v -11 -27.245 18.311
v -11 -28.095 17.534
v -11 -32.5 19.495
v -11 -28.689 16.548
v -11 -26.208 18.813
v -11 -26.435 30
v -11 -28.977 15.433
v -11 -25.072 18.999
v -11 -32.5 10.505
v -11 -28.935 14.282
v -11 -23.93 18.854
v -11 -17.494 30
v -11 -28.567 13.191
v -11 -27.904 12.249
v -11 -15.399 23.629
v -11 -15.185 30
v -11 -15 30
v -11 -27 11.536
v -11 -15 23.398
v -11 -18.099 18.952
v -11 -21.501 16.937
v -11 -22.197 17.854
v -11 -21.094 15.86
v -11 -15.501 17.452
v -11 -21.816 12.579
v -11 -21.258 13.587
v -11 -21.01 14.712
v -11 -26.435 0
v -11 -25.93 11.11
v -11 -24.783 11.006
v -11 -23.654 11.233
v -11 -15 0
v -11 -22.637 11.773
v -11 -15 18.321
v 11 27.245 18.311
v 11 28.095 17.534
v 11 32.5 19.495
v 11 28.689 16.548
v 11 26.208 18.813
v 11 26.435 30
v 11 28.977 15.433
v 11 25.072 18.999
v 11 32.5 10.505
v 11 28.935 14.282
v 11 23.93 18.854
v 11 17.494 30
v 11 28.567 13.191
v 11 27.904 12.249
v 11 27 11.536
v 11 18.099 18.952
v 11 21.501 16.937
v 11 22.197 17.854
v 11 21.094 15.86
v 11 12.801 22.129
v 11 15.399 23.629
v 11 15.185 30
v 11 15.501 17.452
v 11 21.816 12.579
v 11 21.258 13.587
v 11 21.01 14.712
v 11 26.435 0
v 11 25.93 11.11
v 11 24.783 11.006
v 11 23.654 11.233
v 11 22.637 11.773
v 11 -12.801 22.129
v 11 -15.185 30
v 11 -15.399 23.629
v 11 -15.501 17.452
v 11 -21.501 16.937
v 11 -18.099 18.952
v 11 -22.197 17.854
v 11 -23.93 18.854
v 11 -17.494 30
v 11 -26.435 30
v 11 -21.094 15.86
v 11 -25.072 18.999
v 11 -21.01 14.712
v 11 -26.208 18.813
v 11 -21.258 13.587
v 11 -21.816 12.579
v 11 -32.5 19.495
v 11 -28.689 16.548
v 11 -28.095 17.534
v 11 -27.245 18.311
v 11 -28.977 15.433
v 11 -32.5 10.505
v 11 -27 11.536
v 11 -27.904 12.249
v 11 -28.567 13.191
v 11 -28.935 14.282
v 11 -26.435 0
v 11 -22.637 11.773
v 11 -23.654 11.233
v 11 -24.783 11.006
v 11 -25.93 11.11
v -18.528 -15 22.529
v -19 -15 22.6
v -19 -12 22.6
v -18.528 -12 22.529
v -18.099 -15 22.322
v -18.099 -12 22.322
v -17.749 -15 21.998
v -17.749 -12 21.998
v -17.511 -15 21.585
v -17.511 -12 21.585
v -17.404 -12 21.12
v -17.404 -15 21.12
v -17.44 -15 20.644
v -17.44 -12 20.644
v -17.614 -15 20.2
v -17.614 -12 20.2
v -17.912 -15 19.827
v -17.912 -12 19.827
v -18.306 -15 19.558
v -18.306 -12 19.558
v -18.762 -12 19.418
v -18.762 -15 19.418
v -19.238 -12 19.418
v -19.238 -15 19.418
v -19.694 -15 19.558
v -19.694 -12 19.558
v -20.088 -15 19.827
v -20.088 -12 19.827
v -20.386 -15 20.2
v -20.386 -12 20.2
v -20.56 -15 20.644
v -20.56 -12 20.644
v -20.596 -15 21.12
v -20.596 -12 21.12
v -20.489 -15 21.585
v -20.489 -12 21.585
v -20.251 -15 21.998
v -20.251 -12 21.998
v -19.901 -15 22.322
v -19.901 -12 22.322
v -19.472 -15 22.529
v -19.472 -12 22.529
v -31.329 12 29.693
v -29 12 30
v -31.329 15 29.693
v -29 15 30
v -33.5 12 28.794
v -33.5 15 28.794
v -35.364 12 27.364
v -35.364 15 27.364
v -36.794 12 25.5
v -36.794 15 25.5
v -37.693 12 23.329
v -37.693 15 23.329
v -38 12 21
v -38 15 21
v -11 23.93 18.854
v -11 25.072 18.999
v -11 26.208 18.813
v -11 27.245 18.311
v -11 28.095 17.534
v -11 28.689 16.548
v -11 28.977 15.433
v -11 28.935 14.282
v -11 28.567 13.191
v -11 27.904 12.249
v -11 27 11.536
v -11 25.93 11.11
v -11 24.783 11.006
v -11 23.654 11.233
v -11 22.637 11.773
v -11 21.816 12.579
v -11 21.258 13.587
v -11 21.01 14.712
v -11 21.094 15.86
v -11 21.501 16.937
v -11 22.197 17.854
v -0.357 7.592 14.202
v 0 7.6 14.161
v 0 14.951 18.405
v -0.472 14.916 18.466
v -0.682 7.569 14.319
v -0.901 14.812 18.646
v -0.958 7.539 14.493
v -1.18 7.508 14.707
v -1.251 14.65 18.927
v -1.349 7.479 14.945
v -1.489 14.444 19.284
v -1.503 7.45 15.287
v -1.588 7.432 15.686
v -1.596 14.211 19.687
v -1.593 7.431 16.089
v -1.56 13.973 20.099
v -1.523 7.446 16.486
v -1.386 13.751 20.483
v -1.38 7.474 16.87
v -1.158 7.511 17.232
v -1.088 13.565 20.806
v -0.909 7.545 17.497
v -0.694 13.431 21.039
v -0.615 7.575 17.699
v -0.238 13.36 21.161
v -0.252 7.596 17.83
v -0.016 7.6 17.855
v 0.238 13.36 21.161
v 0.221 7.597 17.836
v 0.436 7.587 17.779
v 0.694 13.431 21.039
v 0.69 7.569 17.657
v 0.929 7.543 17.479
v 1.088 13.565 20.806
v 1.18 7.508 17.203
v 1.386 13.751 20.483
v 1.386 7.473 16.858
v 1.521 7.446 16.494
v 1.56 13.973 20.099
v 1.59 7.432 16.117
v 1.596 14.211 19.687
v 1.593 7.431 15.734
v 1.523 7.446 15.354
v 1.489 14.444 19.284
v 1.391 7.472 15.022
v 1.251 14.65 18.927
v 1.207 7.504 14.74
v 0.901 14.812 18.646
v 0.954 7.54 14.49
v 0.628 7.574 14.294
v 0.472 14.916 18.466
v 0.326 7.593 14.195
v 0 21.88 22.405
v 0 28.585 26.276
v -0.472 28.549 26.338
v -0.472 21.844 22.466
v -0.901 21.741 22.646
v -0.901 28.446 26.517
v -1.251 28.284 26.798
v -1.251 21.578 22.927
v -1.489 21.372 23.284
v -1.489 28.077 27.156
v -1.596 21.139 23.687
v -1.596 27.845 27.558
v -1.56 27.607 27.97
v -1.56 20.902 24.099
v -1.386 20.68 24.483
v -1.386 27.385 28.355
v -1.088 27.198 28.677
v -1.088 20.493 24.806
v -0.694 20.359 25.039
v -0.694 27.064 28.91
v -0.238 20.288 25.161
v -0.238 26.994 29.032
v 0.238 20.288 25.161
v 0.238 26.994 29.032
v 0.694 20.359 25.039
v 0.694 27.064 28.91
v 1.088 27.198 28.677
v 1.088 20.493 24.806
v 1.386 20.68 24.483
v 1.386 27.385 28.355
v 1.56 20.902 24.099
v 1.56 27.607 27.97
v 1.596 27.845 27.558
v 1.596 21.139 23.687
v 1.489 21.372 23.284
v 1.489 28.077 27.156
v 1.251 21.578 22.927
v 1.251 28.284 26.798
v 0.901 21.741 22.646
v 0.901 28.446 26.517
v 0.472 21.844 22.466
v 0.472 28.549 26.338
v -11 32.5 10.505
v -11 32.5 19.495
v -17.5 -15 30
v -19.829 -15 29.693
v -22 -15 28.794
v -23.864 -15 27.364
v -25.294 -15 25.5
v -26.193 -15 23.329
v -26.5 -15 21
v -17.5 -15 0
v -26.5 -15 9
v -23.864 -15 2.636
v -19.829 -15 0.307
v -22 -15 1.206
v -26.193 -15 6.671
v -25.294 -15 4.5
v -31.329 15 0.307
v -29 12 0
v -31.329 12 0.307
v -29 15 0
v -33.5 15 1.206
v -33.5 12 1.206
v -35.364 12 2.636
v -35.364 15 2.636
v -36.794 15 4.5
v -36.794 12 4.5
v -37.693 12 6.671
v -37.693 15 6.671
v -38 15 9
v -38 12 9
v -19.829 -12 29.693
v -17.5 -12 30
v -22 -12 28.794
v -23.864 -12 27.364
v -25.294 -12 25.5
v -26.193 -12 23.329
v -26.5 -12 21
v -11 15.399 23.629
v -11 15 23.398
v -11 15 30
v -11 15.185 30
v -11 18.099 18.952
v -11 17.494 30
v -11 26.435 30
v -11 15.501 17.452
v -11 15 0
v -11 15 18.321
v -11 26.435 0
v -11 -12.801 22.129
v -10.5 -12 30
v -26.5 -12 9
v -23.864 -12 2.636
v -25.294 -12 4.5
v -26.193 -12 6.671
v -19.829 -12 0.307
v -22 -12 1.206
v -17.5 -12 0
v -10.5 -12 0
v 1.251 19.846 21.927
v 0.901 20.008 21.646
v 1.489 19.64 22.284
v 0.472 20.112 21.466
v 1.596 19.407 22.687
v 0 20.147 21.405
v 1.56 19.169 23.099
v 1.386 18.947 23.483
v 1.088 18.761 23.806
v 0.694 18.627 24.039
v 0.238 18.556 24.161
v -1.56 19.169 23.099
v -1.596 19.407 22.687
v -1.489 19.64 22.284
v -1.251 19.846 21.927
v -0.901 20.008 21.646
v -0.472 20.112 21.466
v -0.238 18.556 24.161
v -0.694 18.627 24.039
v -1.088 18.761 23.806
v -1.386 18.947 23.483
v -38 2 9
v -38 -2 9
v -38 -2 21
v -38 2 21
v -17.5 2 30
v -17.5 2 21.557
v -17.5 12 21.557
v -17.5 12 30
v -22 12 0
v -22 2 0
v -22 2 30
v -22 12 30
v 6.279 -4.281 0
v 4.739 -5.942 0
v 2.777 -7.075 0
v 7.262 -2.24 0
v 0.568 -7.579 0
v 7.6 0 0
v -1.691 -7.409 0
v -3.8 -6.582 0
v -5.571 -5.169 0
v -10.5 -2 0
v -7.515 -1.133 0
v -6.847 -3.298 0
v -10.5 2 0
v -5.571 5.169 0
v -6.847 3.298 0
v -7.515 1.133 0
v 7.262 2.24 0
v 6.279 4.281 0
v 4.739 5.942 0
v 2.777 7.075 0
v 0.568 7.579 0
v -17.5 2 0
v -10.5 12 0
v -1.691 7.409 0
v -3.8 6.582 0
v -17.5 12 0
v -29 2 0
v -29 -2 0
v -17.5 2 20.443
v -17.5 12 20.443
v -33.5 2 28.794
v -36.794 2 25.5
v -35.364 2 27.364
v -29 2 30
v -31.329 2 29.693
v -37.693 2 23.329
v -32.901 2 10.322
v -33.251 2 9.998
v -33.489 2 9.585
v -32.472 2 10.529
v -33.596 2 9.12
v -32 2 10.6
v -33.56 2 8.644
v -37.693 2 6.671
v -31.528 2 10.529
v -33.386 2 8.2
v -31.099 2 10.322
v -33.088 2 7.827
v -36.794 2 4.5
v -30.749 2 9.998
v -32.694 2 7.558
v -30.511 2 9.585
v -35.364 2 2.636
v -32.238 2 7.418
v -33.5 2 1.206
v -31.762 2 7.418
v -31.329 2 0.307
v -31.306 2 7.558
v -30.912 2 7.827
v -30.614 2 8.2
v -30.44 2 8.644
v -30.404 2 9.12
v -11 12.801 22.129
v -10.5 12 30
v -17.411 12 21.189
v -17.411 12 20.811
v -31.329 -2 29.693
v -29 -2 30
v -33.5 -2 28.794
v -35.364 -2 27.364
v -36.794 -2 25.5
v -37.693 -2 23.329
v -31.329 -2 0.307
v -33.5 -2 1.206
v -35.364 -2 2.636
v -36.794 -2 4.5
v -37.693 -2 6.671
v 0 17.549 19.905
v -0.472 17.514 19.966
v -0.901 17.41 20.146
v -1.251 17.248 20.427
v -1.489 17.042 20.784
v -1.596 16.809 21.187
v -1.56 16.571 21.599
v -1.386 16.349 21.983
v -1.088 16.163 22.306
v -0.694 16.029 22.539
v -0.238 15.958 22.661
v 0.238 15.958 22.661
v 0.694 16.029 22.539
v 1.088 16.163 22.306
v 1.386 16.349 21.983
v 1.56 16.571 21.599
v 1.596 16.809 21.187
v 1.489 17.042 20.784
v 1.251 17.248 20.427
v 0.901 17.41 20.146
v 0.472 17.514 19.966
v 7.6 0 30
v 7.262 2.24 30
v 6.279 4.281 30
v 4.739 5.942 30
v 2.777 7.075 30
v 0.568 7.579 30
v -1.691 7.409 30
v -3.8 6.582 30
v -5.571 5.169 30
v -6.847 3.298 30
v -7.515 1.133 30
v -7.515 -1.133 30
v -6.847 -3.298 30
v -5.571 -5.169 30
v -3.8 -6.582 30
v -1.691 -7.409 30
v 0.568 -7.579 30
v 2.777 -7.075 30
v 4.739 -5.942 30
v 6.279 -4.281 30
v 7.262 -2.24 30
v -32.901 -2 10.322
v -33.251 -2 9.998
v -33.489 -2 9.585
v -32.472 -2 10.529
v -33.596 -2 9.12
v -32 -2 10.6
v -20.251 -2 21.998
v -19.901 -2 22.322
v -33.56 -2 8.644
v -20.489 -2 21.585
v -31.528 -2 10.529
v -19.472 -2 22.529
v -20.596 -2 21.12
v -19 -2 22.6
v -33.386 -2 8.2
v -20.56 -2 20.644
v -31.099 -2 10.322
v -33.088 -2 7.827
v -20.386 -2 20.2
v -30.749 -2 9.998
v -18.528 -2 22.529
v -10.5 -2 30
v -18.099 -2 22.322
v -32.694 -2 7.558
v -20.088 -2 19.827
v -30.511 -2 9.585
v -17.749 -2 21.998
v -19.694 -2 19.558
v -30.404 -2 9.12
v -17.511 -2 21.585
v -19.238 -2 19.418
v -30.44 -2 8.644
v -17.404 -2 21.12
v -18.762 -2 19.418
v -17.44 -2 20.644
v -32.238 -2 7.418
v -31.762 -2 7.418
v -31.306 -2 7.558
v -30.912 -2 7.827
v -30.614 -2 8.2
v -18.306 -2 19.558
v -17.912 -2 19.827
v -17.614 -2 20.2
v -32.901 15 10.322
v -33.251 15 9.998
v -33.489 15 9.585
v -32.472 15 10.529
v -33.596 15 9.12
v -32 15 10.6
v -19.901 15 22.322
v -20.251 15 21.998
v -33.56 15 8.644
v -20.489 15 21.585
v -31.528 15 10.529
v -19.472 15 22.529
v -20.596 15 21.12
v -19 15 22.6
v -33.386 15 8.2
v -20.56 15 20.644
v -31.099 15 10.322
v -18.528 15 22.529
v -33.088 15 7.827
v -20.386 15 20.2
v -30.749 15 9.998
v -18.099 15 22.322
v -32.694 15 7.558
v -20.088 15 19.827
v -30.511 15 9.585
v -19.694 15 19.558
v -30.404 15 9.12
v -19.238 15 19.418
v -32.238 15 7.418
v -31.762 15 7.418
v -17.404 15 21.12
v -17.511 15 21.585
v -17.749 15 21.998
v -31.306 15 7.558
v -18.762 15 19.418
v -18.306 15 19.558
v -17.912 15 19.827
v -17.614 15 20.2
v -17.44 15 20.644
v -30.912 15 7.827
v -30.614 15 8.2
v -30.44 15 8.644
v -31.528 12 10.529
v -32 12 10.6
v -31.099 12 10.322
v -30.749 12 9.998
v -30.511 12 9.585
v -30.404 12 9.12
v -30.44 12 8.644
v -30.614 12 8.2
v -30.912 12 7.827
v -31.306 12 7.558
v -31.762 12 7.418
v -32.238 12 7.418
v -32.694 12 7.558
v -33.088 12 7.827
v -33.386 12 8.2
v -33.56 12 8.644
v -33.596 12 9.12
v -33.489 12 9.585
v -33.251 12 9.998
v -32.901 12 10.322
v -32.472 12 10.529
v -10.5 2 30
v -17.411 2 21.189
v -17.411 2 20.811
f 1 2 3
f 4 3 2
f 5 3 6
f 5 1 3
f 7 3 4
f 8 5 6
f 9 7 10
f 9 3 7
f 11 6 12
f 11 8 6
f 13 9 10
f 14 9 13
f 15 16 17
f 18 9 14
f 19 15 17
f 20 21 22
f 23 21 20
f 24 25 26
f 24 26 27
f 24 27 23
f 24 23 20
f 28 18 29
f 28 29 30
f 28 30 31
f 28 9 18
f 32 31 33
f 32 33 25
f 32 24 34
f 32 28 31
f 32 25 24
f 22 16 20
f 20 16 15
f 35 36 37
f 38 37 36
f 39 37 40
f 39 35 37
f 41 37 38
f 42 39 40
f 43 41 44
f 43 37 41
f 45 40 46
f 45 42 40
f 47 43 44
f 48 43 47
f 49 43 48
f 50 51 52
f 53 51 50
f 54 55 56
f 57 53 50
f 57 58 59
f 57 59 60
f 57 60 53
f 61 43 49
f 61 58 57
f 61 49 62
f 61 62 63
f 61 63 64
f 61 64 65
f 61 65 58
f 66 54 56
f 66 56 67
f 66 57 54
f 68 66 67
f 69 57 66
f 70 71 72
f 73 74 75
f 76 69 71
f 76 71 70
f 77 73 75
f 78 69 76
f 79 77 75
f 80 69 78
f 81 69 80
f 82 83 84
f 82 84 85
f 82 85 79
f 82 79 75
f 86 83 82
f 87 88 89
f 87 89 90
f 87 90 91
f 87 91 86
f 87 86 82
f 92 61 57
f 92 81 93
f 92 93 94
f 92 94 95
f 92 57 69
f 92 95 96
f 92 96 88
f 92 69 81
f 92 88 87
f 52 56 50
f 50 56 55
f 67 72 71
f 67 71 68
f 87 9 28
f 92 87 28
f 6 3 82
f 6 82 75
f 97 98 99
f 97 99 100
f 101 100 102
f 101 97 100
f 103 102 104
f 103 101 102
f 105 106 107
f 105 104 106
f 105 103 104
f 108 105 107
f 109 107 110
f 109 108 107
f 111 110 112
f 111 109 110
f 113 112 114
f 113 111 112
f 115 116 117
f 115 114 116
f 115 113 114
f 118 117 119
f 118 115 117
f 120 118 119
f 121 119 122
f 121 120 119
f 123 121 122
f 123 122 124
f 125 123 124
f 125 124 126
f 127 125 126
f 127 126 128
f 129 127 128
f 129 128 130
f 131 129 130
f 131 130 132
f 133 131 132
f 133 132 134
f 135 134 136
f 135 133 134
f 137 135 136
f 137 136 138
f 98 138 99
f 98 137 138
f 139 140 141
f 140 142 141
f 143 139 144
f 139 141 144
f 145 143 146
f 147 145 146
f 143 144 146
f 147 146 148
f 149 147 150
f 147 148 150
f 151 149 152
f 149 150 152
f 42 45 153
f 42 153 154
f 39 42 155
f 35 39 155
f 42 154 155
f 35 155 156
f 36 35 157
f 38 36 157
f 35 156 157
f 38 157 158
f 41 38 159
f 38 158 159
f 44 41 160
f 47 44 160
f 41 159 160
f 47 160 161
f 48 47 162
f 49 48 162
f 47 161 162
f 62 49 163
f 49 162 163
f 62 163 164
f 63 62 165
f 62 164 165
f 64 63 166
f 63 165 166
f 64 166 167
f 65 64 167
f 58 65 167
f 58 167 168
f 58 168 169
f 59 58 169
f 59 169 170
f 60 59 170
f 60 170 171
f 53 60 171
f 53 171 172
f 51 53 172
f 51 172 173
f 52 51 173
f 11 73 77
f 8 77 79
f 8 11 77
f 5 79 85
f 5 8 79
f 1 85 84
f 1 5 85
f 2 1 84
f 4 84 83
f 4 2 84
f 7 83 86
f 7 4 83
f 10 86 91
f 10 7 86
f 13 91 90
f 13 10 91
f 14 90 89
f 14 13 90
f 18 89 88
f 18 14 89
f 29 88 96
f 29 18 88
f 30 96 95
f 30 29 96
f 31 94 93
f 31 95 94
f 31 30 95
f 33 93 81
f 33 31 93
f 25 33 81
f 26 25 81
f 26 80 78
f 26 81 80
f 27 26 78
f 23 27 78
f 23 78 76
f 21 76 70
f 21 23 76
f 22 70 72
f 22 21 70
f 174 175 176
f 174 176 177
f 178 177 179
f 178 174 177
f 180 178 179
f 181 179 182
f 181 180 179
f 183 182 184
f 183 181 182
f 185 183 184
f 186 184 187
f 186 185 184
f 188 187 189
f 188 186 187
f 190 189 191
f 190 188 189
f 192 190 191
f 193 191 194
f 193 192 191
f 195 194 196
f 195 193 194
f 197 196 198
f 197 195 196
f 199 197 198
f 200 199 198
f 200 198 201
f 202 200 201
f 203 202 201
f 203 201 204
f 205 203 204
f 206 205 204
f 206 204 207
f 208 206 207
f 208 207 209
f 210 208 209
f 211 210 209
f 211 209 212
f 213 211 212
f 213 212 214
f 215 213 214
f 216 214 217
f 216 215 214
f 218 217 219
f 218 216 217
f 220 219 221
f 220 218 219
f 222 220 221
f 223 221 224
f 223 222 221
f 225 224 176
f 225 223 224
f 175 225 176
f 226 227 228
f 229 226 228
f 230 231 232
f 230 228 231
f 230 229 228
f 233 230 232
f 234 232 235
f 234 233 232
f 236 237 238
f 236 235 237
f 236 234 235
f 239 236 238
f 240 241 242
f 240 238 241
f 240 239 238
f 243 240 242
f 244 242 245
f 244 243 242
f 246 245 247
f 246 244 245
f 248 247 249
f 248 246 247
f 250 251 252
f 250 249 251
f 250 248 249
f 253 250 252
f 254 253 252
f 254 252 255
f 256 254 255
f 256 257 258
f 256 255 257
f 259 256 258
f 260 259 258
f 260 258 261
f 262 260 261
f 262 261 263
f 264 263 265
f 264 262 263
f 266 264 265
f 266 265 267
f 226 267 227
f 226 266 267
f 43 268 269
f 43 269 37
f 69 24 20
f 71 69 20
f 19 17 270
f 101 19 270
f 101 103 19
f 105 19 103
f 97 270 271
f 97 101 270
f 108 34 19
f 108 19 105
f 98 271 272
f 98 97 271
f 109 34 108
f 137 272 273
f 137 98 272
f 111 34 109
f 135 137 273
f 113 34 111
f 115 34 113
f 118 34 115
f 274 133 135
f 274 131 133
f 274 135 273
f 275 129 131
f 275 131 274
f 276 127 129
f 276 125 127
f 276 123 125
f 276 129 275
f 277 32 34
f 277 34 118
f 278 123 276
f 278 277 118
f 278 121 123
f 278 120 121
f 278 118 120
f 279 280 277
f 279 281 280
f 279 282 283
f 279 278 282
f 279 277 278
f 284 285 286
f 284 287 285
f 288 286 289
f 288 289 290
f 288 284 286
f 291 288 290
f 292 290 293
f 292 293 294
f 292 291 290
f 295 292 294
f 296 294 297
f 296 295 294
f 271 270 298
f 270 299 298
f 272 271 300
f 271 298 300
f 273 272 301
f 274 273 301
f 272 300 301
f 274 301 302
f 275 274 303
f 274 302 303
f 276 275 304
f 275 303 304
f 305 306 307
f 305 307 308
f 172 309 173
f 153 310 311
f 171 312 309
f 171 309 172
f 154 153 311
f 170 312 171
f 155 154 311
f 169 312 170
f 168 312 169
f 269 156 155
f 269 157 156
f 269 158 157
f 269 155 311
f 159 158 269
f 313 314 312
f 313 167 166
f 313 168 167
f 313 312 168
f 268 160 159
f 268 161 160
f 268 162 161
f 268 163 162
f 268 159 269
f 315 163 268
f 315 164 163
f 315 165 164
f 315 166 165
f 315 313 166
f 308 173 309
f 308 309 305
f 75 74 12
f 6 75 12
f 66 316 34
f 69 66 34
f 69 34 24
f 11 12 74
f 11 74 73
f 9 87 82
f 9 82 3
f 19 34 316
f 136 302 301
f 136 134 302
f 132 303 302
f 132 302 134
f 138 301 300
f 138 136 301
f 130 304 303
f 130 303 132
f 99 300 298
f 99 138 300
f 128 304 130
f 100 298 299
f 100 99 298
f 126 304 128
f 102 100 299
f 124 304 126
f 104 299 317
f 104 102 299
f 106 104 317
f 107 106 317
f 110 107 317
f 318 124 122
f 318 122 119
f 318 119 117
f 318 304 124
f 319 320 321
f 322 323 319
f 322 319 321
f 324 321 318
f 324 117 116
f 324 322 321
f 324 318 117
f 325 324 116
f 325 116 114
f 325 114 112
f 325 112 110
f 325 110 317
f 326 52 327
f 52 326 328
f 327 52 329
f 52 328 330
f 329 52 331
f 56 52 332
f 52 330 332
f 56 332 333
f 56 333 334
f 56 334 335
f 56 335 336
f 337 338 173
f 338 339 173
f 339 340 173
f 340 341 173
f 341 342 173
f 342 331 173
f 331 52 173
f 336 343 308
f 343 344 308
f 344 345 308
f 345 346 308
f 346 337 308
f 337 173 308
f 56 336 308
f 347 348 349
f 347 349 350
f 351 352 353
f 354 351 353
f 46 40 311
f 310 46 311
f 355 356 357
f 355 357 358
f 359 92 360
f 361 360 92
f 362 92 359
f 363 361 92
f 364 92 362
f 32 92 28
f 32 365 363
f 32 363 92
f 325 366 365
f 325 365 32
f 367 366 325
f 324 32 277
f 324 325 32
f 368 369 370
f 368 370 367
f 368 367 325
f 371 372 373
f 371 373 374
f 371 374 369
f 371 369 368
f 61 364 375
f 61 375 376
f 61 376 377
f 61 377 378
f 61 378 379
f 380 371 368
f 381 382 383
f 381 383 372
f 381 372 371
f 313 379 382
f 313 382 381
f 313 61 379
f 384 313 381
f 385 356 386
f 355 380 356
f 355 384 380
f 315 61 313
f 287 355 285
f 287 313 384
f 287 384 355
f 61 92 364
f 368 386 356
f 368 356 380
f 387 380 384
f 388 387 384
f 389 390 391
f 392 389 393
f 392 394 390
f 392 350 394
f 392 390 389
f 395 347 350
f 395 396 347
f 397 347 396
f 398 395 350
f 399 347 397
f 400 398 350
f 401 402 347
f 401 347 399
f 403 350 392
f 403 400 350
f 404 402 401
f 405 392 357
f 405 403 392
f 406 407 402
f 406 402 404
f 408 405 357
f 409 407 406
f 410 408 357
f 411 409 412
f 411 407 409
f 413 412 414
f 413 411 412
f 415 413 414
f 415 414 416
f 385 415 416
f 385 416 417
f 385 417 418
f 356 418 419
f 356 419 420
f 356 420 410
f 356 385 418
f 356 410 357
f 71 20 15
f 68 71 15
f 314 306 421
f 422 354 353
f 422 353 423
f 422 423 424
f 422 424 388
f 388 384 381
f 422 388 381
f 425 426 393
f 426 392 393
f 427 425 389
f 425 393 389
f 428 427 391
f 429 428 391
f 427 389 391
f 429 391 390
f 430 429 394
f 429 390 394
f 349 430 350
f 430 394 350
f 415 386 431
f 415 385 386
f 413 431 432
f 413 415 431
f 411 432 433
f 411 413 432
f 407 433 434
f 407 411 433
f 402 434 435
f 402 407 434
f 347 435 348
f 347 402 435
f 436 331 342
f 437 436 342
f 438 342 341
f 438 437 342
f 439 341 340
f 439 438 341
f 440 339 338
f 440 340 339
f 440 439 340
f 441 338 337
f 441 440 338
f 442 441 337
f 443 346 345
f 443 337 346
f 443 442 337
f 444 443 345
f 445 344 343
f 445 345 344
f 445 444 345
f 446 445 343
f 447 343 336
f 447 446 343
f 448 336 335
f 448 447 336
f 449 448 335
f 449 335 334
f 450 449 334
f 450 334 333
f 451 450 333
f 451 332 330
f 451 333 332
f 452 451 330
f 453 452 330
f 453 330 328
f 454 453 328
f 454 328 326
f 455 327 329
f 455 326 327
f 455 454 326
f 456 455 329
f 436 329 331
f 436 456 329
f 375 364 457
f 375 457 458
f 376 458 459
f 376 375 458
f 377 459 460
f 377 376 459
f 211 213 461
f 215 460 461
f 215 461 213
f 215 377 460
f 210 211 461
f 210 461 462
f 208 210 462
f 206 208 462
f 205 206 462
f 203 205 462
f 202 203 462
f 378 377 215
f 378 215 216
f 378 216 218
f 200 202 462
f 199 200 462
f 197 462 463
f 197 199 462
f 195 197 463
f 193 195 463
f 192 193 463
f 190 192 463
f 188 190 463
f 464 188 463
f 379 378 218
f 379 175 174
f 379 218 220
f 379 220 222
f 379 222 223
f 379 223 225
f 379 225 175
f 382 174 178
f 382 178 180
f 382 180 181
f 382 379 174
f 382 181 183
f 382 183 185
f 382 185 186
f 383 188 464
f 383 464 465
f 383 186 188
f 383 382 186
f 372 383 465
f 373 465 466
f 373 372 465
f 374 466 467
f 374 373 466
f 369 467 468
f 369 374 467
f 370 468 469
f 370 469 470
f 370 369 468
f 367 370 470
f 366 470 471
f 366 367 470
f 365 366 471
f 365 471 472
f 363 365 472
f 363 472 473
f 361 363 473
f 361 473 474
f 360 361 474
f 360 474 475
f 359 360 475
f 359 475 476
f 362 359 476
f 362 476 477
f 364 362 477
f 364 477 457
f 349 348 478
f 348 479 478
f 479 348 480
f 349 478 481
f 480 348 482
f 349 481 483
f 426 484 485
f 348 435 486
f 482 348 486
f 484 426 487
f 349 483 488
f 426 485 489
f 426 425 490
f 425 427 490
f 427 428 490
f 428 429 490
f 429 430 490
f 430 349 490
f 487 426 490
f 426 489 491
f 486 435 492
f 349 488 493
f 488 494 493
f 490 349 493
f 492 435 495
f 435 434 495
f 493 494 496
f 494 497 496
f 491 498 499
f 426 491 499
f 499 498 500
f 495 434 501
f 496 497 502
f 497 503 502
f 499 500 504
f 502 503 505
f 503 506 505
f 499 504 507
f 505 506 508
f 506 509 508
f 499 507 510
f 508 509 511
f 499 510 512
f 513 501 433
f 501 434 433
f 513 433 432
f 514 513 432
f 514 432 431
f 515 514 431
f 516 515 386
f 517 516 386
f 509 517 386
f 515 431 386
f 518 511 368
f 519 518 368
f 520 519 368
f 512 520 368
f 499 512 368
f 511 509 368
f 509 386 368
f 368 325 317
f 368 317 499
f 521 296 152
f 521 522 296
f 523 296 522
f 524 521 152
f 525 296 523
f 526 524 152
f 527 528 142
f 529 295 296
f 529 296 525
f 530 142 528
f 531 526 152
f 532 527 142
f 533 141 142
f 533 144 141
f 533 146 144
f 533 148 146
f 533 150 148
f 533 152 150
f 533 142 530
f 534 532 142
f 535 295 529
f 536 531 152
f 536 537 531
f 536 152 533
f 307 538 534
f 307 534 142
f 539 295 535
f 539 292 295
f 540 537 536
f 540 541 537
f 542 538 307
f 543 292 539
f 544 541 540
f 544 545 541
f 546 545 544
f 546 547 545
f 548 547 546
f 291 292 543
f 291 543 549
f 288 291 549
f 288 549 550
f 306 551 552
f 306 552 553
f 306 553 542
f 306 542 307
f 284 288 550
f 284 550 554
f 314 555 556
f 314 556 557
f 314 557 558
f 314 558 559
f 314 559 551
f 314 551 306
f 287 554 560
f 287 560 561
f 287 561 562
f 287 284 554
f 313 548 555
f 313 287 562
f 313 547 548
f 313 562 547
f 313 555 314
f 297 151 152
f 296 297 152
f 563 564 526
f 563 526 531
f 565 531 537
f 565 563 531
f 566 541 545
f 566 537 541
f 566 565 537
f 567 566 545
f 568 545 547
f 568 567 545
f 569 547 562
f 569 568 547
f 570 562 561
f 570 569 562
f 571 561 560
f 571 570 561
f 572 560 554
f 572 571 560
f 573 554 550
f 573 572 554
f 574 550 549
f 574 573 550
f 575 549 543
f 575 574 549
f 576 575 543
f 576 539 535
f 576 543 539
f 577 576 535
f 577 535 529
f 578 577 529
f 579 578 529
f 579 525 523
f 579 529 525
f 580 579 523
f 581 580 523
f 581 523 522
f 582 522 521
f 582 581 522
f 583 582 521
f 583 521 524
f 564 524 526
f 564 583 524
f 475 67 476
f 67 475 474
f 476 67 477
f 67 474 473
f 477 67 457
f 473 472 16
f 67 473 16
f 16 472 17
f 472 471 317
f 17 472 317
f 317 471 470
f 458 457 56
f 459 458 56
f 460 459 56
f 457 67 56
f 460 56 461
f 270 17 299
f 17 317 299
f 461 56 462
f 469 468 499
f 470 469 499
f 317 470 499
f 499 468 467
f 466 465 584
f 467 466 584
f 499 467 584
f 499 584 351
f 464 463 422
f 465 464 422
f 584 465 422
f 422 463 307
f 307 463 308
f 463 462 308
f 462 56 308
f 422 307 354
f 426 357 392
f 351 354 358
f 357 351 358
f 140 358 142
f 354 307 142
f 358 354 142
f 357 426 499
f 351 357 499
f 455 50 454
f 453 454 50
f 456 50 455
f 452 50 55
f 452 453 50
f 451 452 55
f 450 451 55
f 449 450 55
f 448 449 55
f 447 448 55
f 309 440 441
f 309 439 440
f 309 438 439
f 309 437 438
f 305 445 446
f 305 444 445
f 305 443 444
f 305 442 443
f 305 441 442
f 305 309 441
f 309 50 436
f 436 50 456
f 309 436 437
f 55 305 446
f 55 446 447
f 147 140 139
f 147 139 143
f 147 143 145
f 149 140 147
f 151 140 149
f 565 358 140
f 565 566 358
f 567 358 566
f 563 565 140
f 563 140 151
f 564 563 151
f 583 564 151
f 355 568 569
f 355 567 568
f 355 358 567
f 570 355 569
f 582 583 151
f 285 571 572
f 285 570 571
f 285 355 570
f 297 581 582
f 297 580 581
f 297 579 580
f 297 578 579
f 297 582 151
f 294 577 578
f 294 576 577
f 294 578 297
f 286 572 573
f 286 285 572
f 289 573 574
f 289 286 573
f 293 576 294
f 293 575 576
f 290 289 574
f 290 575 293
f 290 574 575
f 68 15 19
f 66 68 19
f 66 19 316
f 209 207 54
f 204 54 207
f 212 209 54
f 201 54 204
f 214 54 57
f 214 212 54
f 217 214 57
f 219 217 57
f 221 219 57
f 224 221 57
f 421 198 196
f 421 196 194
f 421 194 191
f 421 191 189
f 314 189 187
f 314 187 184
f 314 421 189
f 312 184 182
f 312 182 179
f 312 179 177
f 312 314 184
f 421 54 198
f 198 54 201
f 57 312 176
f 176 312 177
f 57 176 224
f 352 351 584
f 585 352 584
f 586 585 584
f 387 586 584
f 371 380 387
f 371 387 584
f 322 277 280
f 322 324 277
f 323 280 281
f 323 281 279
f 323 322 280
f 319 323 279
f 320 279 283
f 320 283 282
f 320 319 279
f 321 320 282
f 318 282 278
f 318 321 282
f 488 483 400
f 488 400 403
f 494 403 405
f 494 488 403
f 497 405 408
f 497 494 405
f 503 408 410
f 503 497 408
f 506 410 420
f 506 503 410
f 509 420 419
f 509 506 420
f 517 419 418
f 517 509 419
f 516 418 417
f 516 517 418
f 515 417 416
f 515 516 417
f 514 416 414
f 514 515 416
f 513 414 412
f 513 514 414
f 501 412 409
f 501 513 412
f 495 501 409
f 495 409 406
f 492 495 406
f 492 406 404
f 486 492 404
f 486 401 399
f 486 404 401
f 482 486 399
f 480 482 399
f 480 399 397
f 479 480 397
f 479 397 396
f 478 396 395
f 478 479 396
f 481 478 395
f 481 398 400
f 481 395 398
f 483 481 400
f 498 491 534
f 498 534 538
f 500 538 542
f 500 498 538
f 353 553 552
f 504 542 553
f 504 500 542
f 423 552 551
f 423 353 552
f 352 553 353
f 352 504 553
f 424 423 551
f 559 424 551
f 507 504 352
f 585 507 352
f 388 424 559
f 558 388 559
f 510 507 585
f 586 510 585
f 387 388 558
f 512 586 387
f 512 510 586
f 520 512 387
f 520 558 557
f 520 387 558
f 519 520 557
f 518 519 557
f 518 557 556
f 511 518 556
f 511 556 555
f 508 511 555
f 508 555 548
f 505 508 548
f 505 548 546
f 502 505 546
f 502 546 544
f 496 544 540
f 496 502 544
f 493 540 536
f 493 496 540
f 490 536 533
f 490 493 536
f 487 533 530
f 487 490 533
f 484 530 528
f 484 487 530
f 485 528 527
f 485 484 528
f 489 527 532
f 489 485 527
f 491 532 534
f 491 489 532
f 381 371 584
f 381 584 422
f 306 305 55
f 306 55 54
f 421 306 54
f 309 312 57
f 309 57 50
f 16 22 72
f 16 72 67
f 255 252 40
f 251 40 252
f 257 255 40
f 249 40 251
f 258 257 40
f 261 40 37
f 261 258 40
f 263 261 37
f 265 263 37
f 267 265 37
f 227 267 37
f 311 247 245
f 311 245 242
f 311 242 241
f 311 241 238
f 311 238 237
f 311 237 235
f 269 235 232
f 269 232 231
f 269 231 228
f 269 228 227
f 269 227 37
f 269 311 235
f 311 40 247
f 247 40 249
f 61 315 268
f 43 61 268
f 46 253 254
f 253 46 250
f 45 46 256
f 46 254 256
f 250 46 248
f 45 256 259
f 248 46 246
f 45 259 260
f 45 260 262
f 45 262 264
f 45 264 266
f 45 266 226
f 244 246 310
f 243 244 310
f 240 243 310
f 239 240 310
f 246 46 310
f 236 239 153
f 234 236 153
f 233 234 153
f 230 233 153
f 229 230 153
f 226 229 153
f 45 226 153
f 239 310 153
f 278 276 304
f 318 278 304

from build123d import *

# Parameters (mm, degrees)
ESBO_O2_R                  = 7.6
ESBO_O2_W                  = 7
ESBO_O2_H                  = 10
RESSALTO_EXTRUS_O1_DEPTH   = 30
CORTE_EXTRUS_O1_DEPTH      = 52.819397912
CORTE_EXTRUS_O2_DEPTH      = 68.825142831
CORTE_EXTRUS_O2_DEPTH_BACK = 68.825142831
ESBO_O4_R                  = 1.6
FILETE2_R                  = 9
CORTE_EXTRUS_O3_DEPTH      = 67.882564304
CORTE_EXTRUS_O3_DEPTH_BACK = 10
ESBO_O7_R                  = 1.6


with BuildPart() as part:
    # Esboço2 → Ressalto-extrusão1 (new body)
    with BuildSketch(Plane.XY):
        Polygon((-11, 15), (-11, 32.5), (11, 32.5), (11, -32.5), (-11, -32.5), (-11, -15), (-26.5, -15), (-26.5, -12), (-10.5, -12), (-10.5, -2), (-26.5, -2), (-38, -2), (-38, 2), (-22, 2), (-22, 12), (-38, 12), (-38, 15), align=None)
        Circle(ESBO_O2_R, mode=Mode.SUBTRACT)
        with Locations((-14, 7)):
            Rectangle(ESBO_O2_W, ESBO_O2_H, mode=Mode.SUBTRACT)
    extrude(amount=RESSALTO_EXTRUS_O1_DEPTH)

    # Esboço3 → Corte-extrusão1 (cut, through all)
    with BuildSketch(Plane.ZY.offset(11)):
        Polygon((30, 26.434795421), (19.494757511, 32.5), (30, 32.5), align=None)
        Polygon((18.952178178, 18.099406712), (23.628715358, 15.399406712), (22.128715358, 12.8013305), (17.452178178, 15.5013305), align=None)
        with BuildLine():
            Line((17.854101966, 22.197482923), (31.133039027, 14.530885036))
            Line((31.133039027, 14.530885036), (32.133039027, 16.262935844))
            Line((32.133039027, 16.262935844), (18.854101966, 23.929533731))
            ThreePointArc((18.854101966, 23.929533731), (11.535898385, 27), (17.854101966, 22.197482923))
        make_face()
        with BuildLine():
            Line((31.133039027, -14.530885036), (32.133039027, -16.262935844))
            Line((32.133039027, -16.262935844), (18.854101966, -23.929533731))
            ThreePointArc((18.854101966, -23.929533731), (11.535898385, -27), (17.854101966, -22.197482923))
            Line((17.854101966, -22.197482923), (31.133039027, -14.530885036))
        make_face()
        Polygon((23.628715358, -15.399406712), (22.128715358, -12.8013305), (17.452178178, -15.5013305), (18.952178178, -18.099406712), align=None)
        Polygon((0, 26.434795421), (10.505242489, 32.5), (0, 32.5), align=None)
        Polygon((30, -32.5), (19.494757511, -32.5), (30, -26.434795421), align=None)
        Polygon((0, -32.5), (10.505242489, -32.5), (0, -26.434795421), align=None)
    extrude(amount=-CORTE_EXTRUS_O1_DEPTH, mode=Mode.SUBTRACT)

    # Esboço4 → Corte-extrusão2 (cut, two sides: drawn at the far end of the back side and taken through both)
    with BuildSketch(Plane(origin=(0, 15, 0), x_dir=(1, 0, 0), z_dir=(0, 1, 0)).offset(-CORTE_EXTRUS_O2_DEPTH_BACK)):
        with Locations(Location((-32, -9, 0), (0, 0, 270))):
            Circle(ESBO_O4_R)
        with Locations(Location((-19, -21, 0), (0, 0, 270))):
            Circle(ESBO_O4_R)
    extrude(amount=CORTE_EXTRUS_O2_DEPTH + CORTE_EXTRUS_O2_DEPTH_BACK, mode=Mode.SUBTRACT)

    # Filete2
    filete2_edges = [part.edges().sort_by_distance(p)[0] for p in [
        (-38, 13.5, 30),
        (-26.5, -13.5, 0),
        (-38, 0, 0),
        (-38, 13.5, 0),
        (-38, 0, 30),
        (-26.5, -13.5, 30),
    ]]
    fillet(filete2_edges, radius=FILETE2_R)

    # Esboço7 → Corte-extrusão3 (cut, two sides: drawn at the far end of the back side and taken through both)
    with BuildSketch(Plane(origin=(0, 19.183012702, 11.075317547), x_dir=(1, 0, 0), z_dir=(0, 0.8660254037844418, 0.4999999999999945)).offset(-CORTE_EXTRUS_O3_DEPTH_BACK)):
        with Locations(Location((0, -10.063364403, 0), (0, 0, 90))):
            Circle(ESBO_O7_R)
    extrude(amount=CORTE_EXTRUS_O3_DEPTH + CORTE_EXTRUS_O3_DEPTH_BACK, mode=Mode.SUBTRACT)


solid = part.part
